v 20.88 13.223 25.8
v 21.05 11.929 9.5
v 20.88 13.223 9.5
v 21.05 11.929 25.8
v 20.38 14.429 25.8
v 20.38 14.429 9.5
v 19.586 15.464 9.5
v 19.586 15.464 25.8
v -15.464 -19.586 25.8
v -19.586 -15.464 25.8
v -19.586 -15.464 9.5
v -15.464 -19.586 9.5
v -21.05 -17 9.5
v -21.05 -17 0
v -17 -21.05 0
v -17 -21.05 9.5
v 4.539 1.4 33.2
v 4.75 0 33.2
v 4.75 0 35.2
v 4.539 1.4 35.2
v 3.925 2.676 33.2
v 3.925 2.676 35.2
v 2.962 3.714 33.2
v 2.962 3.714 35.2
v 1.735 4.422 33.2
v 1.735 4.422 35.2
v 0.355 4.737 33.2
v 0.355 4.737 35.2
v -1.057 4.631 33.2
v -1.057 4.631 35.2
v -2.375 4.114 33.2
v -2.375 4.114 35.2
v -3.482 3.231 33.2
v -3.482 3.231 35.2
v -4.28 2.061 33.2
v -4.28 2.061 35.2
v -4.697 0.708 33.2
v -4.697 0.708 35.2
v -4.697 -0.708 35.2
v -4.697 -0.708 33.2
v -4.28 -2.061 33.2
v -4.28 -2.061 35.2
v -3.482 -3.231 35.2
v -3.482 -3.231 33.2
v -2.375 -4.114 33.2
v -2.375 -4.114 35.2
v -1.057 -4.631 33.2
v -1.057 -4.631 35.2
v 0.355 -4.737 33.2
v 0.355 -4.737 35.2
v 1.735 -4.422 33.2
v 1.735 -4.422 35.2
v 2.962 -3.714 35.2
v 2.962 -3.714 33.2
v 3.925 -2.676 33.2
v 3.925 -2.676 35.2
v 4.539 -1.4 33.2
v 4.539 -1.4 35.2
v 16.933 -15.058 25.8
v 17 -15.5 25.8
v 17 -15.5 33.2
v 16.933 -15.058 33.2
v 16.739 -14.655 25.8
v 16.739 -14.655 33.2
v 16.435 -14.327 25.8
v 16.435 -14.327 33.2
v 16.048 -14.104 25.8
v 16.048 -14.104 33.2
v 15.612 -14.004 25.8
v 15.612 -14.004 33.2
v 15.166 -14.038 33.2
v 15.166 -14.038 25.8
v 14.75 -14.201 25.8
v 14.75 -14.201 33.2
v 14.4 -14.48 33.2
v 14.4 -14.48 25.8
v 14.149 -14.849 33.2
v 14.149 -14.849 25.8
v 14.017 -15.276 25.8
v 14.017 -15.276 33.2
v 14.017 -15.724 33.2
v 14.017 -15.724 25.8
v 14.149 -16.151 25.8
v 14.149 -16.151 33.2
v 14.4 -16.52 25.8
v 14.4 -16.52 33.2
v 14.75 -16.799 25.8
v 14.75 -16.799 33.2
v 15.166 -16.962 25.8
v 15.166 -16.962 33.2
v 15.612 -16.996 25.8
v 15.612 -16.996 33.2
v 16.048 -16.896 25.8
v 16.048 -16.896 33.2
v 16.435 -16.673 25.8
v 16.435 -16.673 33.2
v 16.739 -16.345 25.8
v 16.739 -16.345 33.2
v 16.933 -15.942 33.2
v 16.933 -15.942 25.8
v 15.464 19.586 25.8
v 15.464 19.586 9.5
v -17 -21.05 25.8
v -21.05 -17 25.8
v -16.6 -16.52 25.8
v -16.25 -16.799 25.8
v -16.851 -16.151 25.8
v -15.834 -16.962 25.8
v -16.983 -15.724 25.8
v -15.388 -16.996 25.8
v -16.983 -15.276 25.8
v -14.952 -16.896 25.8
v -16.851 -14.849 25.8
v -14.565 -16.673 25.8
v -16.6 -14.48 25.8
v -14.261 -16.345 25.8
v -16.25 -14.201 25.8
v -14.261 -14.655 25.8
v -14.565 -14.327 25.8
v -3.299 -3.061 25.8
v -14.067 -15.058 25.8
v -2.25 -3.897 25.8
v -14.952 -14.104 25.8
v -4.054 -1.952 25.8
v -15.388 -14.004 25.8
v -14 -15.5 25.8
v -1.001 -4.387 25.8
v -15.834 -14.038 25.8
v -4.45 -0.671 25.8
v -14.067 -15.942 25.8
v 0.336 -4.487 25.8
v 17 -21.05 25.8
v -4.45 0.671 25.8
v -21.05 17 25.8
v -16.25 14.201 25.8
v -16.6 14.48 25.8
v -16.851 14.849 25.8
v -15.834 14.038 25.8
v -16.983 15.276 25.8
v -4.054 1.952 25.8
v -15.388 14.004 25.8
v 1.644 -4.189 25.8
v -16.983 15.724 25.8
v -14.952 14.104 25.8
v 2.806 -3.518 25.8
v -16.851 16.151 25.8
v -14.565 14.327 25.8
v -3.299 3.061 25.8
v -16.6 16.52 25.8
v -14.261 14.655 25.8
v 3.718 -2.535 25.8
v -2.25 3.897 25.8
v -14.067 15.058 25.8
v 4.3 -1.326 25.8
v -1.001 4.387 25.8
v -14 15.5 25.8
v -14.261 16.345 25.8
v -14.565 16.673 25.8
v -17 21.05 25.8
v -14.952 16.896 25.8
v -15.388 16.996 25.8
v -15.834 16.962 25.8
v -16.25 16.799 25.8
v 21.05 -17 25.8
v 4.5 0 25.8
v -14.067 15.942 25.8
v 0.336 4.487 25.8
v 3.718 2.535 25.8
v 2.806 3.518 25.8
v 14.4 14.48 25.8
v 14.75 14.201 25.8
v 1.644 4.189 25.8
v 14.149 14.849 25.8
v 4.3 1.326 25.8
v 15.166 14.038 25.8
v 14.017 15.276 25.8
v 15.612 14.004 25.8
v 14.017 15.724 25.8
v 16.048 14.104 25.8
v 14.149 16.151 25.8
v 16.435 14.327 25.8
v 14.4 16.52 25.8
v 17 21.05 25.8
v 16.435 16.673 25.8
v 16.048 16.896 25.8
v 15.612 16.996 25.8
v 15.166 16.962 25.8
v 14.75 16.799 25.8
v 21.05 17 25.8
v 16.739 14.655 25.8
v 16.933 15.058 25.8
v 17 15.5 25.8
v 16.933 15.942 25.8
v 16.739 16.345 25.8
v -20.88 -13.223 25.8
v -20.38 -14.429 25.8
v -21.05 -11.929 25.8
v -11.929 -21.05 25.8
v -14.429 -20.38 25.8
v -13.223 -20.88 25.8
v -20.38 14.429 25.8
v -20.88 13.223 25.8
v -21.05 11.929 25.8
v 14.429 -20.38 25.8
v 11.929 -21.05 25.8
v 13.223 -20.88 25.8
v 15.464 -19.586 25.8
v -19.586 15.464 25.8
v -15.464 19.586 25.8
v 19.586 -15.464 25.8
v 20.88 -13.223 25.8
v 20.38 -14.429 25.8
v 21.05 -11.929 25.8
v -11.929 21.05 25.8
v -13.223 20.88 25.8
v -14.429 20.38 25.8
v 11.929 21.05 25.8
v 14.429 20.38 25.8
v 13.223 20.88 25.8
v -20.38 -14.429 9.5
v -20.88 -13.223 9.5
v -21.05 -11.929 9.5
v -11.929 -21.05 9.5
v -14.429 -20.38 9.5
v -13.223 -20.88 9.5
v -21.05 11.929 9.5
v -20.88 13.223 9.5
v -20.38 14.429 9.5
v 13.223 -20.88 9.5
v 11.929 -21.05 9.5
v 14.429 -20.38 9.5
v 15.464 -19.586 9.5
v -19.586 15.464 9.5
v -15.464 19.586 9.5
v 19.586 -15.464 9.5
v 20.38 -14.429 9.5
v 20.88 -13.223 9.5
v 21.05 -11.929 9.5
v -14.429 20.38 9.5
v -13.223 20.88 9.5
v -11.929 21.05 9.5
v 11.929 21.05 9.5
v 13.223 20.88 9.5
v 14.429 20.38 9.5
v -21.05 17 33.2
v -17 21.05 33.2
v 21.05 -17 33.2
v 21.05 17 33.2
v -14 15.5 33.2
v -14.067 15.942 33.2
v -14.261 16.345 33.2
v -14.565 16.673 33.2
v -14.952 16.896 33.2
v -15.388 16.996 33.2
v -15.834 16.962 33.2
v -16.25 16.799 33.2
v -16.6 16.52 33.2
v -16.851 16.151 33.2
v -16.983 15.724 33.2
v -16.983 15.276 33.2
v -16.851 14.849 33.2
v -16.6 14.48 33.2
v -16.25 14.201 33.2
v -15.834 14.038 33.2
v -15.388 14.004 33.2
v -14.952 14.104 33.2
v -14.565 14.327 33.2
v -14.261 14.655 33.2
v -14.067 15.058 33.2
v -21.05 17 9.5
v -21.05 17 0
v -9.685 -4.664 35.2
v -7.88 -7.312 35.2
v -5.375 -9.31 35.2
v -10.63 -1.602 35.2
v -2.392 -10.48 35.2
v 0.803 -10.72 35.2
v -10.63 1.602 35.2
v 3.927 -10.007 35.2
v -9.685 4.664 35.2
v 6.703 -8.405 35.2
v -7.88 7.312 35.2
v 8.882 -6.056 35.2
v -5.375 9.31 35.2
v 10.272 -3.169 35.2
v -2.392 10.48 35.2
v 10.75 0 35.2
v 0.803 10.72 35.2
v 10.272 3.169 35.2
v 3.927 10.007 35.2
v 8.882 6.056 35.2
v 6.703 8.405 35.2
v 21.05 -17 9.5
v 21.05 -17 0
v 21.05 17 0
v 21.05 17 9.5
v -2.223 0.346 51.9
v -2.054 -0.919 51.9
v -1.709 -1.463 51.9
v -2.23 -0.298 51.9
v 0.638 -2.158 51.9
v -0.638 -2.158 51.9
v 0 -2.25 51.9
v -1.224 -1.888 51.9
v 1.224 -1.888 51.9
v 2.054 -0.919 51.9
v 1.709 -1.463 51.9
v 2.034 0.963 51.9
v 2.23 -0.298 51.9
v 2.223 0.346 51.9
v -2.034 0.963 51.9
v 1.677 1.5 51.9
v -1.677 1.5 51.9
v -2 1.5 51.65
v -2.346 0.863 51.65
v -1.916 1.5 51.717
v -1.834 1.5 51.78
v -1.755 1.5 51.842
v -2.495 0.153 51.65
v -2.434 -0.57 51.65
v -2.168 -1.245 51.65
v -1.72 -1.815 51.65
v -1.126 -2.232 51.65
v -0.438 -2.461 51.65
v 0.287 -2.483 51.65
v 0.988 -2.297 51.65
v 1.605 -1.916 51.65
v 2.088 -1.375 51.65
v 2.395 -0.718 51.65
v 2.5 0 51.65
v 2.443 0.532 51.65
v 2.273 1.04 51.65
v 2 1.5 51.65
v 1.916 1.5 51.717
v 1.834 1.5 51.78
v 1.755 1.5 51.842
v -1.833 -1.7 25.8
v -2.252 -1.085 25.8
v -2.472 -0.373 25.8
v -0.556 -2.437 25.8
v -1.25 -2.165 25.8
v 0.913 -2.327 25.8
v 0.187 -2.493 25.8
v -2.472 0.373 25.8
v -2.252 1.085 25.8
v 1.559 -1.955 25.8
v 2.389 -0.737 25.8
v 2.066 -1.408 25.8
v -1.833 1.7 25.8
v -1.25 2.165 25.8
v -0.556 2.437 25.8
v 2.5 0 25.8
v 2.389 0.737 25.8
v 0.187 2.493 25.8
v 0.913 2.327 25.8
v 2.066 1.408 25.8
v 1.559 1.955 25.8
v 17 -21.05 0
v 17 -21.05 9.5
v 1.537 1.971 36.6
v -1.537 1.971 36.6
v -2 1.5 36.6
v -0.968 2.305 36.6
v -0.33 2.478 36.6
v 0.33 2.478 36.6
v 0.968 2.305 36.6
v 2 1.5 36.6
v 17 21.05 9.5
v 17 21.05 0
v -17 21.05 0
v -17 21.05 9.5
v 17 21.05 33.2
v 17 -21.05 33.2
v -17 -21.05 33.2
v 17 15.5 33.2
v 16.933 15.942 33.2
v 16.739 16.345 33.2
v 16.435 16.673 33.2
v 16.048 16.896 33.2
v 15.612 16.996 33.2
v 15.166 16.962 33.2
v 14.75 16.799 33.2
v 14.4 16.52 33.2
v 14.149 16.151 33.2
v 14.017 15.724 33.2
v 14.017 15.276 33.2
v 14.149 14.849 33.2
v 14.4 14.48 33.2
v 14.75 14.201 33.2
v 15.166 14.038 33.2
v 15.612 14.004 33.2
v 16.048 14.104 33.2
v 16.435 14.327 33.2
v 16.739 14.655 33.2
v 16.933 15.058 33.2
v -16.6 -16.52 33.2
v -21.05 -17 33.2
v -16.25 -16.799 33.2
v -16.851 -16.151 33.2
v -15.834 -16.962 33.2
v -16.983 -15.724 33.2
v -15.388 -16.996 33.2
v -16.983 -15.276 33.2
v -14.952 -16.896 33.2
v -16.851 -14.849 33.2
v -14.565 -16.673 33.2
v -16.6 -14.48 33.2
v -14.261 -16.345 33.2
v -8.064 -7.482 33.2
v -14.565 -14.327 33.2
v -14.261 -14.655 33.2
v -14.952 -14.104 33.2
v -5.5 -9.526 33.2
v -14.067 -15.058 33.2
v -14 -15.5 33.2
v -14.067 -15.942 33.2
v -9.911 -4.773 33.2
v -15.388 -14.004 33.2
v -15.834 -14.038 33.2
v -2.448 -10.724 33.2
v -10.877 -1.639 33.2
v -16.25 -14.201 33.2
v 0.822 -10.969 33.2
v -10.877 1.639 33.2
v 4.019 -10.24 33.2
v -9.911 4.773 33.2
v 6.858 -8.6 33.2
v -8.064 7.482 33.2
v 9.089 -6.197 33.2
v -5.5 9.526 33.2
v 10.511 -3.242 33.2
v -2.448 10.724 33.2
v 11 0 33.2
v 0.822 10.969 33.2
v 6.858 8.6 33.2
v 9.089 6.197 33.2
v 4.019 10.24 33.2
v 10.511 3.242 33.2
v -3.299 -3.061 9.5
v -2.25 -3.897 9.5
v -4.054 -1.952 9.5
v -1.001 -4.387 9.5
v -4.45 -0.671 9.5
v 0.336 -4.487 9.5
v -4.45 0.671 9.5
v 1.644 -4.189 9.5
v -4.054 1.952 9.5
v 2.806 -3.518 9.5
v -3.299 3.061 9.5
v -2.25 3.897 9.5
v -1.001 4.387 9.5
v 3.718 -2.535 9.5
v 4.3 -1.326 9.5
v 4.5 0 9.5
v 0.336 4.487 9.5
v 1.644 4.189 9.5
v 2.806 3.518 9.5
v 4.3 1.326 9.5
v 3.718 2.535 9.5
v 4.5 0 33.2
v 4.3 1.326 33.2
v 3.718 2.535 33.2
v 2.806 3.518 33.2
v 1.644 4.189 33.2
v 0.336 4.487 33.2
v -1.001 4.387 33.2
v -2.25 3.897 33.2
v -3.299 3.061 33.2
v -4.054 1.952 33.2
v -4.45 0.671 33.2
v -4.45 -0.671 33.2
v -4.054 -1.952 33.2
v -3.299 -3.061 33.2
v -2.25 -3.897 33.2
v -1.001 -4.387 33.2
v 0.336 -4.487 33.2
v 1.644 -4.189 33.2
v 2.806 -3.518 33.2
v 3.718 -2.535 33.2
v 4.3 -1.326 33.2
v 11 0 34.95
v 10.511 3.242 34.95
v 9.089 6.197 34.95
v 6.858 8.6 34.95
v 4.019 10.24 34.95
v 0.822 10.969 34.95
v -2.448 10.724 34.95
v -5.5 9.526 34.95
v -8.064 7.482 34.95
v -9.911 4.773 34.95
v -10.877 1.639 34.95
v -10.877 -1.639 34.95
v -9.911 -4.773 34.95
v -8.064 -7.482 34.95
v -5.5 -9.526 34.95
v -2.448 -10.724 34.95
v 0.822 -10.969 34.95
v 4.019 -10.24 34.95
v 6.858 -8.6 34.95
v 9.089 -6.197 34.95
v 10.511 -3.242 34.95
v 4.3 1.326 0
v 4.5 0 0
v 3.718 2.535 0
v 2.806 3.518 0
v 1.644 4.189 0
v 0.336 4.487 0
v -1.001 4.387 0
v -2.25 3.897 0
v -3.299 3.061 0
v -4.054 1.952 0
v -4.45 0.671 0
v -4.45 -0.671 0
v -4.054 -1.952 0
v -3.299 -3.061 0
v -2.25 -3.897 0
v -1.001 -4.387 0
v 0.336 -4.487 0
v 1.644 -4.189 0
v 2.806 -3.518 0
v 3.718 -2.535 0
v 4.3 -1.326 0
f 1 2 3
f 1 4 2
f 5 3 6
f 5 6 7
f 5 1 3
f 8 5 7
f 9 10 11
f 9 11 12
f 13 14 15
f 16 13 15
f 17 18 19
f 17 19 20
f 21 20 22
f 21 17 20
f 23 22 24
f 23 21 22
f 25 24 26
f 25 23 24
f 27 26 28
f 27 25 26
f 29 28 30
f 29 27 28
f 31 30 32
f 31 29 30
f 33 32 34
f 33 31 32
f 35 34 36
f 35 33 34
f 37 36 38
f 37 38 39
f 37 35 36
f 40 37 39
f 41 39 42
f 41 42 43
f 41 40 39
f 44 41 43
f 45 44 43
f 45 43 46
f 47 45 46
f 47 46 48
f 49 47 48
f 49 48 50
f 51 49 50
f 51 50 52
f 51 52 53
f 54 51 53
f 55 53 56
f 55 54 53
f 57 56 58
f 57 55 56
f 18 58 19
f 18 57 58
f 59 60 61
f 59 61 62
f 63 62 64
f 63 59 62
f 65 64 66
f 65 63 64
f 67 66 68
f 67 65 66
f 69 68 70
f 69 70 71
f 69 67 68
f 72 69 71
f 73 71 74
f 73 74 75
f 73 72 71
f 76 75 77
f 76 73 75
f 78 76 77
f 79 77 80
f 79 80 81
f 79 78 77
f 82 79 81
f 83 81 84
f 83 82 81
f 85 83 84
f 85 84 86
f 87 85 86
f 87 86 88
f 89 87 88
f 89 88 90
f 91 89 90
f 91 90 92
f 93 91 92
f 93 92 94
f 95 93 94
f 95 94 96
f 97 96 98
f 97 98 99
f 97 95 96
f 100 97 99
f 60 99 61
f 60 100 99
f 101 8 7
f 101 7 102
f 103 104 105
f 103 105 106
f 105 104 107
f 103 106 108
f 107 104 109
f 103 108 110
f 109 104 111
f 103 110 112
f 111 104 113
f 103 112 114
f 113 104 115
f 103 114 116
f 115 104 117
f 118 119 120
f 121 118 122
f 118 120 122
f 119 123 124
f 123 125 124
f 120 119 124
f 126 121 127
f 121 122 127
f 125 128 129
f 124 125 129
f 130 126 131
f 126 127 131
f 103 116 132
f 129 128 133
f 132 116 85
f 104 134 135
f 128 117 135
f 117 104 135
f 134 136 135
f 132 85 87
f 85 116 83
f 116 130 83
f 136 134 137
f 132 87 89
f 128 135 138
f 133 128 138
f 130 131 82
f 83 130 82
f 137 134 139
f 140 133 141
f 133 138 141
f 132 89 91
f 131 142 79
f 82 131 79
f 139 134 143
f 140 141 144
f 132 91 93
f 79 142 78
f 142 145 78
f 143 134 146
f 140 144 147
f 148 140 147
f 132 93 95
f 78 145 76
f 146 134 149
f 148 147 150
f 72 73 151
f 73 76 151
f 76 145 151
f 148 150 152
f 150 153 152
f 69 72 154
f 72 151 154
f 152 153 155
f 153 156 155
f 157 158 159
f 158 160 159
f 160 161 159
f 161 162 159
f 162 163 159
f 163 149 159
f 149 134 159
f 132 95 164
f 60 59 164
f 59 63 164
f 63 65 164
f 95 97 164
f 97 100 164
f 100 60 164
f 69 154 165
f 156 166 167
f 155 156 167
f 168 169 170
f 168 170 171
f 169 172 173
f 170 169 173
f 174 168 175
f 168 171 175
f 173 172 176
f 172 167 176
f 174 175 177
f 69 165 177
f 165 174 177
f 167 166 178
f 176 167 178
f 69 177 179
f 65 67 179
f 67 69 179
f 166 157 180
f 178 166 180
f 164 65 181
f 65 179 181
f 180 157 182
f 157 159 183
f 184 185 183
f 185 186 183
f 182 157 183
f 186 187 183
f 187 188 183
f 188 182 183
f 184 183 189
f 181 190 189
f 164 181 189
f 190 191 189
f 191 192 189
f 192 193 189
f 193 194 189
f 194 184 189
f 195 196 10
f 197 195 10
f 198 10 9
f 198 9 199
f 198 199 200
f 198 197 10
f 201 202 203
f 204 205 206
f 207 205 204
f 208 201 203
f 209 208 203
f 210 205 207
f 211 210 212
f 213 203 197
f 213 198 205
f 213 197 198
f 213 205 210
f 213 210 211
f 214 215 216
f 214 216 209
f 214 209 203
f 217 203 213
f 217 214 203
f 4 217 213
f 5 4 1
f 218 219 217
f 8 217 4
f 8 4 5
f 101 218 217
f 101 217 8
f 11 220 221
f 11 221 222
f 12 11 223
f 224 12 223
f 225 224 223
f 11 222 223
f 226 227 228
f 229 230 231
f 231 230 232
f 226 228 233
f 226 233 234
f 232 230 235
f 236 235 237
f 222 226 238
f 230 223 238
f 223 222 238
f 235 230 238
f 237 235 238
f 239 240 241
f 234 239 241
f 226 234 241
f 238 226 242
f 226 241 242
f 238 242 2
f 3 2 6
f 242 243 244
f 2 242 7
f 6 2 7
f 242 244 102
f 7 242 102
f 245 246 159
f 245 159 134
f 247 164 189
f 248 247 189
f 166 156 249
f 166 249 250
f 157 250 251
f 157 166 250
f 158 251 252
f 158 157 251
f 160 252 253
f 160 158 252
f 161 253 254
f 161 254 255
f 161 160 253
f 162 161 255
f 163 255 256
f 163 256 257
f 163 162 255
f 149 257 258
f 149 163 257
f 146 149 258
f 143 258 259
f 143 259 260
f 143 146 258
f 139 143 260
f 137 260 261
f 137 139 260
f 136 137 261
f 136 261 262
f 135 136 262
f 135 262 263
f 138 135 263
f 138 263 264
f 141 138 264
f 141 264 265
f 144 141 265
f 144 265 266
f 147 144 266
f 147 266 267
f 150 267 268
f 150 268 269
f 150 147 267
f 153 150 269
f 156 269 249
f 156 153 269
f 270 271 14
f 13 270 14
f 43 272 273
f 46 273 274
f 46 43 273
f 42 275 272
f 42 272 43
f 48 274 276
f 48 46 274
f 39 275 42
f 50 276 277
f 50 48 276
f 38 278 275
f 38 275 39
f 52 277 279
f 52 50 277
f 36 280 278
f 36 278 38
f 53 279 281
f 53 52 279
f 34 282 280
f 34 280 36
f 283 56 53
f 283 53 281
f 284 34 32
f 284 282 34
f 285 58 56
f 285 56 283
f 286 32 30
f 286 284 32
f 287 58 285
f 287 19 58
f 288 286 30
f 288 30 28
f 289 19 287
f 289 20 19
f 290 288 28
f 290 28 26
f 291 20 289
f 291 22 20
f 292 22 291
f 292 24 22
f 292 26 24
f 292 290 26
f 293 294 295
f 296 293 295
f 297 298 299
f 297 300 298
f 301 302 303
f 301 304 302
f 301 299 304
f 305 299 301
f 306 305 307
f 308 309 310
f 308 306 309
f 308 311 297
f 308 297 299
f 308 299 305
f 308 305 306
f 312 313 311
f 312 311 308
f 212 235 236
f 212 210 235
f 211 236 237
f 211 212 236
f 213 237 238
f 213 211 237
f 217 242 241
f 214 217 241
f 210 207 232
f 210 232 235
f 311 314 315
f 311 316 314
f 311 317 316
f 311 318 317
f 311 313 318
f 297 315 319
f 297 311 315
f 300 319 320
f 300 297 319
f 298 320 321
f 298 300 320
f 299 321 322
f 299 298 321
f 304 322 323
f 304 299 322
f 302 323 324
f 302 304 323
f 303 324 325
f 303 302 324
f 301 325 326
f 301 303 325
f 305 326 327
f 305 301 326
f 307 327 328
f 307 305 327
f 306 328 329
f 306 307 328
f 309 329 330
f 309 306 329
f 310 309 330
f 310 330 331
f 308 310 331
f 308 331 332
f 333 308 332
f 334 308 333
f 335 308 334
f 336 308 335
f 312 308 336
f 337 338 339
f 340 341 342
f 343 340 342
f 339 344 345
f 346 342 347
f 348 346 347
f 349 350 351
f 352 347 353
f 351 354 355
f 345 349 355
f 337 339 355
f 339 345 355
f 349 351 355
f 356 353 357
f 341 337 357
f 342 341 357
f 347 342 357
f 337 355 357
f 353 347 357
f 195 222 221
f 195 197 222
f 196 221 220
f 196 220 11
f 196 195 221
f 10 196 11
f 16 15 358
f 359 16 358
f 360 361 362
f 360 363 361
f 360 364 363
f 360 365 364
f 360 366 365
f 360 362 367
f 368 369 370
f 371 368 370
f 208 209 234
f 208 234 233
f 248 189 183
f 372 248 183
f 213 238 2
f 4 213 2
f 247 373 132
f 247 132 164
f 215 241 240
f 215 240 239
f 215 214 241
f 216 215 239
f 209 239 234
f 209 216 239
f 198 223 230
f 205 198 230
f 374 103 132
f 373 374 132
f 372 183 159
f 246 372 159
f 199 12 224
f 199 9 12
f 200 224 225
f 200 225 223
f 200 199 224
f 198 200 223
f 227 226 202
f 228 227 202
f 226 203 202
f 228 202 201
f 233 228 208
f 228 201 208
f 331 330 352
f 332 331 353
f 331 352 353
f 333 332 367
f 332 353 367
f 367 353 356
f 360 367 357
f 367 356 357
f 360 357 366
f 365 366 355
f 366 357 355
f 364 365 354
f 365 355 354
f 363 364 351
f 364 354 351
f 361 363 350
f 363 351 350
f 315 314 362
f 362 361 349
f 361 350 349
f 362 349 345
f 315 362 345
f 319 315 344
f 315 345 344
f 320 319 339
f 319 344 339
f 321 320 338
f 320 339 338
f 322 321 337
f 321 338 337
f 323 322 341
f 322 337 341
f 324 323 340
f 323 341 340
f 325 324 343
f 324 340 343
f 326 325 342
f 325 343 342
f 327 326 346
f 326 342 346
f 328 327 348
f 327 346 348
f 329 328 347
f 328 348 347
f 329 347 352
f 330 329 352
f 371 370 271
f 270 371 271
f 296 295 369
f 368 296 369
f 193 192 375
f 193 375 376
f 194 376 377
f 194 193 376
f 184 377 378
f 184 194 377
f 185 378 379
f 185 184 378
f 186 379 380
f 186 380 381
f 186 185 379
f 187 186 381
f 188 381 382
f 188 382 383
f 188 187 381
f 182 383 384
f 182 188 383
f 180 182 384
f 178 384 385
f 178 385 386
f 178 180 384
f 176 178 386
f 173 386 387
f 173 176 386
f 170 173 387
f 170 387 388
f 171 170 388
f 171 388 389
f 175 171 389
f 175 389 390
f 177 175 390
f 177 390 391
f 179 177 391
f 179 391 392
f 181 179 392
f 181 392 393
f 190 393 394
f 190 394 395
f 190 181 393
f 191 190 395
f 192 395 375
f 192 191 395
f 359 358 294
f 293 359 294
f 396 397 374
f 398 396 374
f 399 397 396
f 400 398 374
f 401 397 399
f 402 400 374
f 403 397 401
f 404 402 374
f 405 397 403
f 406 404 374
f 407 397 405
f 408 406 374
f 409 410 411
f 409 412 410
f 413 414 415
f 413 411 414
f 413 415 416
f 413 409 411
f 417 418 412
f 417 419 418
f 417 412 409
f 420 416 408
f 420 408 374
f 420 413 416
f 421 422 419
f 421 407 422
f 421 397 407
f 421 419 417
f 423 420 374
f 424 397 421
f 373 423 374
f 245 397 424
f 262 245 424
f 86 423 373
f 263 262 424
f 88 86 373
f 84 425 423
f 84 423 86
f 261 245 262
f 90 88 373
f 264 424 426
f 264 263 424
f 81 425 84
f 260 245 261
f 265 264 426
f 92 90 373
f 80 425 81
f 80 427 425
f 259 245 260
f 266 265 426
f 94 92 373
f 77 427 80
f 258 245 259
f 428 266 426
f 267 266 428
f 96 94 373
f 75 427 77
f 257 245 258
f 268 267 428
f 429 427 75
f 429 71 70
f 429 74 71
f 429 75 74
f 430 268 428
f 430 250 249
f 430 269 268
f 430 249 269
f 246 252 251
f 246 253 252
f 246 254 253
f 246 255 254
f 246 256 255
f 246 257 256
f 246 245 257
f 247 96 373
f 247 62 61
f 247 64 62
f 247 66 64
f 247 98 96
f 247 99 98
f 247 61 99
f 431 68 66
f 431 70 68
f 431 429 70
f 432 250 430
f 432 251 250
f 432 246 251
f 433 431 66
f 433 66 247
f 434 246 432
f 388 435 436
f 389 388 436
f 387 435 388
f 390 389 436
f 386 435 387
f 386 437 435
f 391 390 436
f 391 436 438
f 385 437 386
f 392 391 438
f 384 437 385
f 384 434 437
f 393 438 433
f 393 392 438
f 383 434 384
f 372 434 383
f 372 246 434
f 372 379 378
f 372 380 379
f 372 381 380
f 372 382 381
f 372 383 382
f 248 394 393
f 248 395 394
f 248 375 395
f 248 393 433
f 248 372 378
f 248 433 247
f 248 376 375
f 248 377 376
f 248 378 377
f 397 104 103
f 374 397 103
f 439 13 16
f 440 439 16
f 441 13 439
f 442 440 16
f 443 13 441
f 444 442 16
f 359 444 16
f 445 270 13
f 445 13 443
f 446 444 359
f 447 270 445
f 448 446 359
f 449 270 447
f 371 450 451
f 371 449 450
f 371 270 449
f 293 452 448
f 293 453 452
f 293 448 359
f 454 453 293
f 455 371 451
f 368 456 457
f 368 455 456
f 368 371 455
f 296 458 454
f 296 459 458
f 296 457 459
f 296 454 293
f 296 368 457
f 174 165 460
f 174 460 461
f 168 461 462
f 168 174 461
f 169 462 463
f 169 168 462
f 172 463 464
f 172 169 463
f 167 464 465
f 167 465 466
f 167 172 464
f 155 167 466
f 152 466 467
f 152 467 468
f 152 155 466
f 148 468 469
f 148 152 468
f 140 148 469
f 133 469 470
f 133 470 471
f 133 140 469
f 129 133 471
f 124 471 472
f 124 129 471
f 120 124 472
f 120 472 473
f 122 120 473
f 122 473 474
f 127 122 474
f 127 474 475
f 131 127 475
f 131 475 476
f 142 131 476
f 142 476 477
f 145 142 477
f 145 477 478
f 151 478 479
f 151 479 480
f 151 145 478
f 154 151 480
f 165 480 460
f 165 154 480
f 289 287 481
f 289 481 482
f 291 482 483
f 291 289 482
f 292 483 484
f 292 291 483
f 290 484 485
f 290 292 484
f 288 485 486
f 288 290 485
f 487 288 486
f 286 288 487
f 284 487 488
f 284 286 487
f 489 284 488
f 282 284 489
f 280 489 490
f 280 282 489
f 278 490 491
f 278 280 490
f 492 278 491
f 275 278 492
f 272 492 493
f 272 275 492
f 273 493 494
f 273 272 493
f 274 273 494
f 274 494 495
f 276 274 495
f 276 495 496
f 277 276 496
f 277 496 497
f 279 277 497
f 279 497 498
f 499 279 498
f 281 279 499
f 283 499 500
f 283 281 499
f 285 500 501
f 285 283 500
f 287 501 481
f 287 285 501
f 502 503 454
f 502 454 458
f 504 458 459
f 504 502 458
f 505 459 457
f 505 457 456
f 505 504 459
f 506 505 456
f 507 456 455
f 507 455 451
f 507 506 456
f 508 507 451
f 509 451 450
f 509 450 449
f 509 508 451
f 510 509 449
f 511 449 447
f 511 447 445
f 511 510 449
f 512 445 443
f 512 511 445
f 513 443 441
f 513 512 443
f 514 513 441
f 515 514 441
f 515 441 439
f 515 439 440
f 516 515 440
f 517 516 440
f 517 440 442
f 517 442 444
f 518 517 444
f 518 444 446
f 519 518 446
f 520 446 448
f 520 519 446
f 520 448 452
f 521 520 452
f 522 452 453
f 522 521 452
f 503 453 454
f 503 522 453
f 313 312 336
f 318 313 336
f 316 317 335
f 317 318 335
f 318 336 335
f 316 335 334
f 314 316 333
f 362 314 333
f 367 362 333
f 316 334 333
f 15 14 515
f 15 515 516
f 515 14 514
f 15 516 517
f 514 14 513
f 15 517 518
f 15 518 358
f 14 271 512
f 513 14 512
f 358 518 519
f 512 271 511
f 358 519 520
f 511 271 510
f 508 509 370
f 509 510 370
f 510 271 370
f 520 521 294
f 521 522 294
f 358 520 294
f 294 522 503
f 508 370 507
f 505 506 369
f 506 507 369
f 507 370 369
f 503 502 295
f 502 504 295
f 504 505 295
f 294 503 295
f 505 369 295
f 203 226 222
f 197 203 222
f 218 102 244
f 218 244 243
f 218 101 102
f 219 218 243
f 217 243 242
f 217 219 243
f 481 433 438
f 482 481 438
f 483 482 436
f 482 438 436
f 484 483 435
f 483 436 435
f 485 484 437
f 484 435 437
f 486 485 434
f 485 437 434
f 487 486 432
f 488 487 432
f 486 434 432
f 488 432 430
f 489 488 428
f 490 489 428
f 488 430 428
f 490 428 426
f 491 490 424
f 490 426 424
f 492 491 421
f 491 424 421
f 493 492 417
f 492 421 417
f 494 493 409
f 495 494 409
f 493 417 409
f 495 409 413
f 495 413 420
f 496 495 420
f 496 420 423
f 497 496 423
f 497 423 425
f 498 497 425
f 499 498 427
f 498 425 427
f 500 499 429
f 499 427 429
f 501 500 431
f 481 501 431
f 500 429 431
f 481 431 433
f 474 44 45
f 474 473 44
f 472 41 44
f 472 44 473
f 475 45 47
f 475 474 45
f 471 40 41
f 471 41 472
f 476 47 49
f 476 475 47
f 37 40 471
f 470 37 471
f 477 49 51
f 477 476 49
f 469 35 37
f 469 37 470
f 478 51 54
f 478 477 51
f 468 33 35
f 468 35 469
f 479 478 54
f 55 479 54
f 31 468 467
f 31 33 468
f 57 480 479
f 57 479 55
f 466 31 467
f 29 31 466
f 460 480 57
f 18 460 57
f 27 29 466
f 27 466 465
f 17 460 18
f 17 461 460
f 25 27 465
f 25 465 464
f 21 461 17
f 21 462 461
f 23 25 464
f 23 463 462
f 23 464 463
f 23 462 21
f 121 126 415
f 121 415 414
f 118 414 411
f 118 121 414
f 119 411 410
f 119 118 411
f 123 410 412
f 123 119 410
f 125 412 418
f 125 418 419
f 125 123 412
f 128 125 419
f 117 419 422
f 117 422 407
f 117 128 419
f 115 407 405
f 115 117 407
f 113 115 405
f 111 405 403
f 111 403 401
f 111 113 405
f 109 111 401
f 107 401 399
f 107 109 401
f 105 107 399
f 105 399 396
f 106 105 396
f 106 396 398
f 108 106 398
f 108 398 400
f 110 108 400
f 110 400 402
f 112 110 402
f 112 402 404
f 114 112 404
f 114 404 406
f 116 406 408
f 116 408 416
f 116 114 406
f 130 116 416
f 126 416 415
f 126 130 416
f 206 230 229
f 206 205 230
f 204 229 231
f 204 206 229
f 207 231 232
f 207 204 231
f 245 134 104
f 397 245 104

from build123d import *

# Parameters (mm, degrees)
F0_R      = 4.5
F1_DEPTH  = 9.5
F3_DEPTH  = 16.3
F4_R      = 1.5
F4_R_2    = 4.5
F5_DEPTH  = 7.4
F6_R      = 11
F6_R_2    = 4.75
F7_DEPTH  = 2
F8_SIZE   = 0.25
F9_R      = 2.5
F10_DEPTH = 26.1
F11_SIZE  = 0.25
F12_W     = 6.4639246052
F12_H     = 1.9025028002
F13_DEPTH = 15.3
F14_R     = 5


with BuildPart() as f1:
    # F0 (on Top) → F1 (new body)
    with BuildSketch(Plane.XY):
        Polygon((17, 21.05), (0, 21.05), (-17, 21.05), (-21.05, 17), (-21.05, 0), (-21.05, -17), (-17, -21.05), (0, -21.05), (17, -21.05), (21.05, -17), (21.05, 0), (21.05, 17), align=None)
        Circle(F0_R, mode=Mode.SUBTRACT)
    extrude(amount=F1_DEPTH)


with BuildPart() as f3:
    # F2 (on face) → F3 (new body)
    with BuildSketch(Plane.XY.offset(9.5)):
        Polygon((-21.05, 14), (-21.05, 0), (-21.05, -14), (-14, -21.05), (0, -21.05), (14, -21.05), (21.05, -14), (21.05, 0), (21.05, 14), (14, 21.05), (0, 21.05), (-14, 21.05), align=None)
    extrude(amount=F3_DEPTH)

    # F14
    f14_edges = [f3.edges().sort_by_distance(p)[0] for p in [
        (14, 21.05, 17.65),
        (21.05, 14, 17.65),
        (21.05, -14, 17.65),
        (14, -21.05, 17.65),
        (-14, -21.05, 17.65),
        (-21.05, -14, 17.65),
        (-21.05, 14, 17.65),
        (-14, 21.05, 17.65),
    ]]
    fillet(f14_edges, radius=F14_R)


with BuildPart() as f5:
    # F4 (on face) → F5 (new body)
    with BuildSketch(Plane.XY.offset(25.8)):
        Polygon((16.9999995679, 21.0500004321), (-4.321e-07, 21.0500004321), (-17.0000004321, 21.0500004321), (-21.0500004321, 17.0000004321), (-21.0500004321, 4.321e-07), (-21.0500004321, -16.9999995679), (-17.0000004321, -21.0499995679), (-4.321e-07, -21.0499995679), (16.9999995679, -21.0499995679), (21.0499995679, -16.9999995679), (21.0499995679, 4.321e-07), (21.0499995679, 17.0000004321), align=None)
        with Locations((-15.5, -15.5)):
            Circle(F4_R, mode=Mode.SUBTRACT)
        with Locations((15.5, -15.5)):
            Circle(F4_R, mode=Mode.SUBTRACT)
        with Locations((-4.321e-07, 4.321e-07)):
            Circle(F4_R_2, mode=Mode.SUBTRACT)
        with Locations((-15.5, 15.5)):
            Circle(F4_R, mode=Mode.SUBTRACT)
        with Locations((15.5, 15.5)):
            Circle(F4_R, mode=Mode.SUBTRACT)
    extrude(amount=F5_DEPTH)

    # F6 (on face) → F7 (join)
    with BuildSketch(Plane.XY.offset(33.2)):
        with Locations((-4.321e-07, 4.321e-07)):
            Circle(F6_R)
        with Locations((-4.321e-07, 4.321e-07)):
            Circle(F6_R_2, mode=Mode.SUBTRACT)
    extrude(amount=F7_DEPTH)

    # F8
    f8_edges = [f5.edges().sort_by_distance(p)[0] for p in [
        (-11, 0, 35.2),
    ]]
    chamfer(f8_edges, length=F8_SIZE)


with BuildPart() as f10:
    # F9 (on face) → F10 (new body)
    with BuildSketch(Plane.XY.offset(25.8)):
        Circle(F9_R)
    extrude(amount=F10_DEPTH)

    # F11
    f11_edges = [f10.edges().sort_by_distance(p)[0] for p in [
        (-2.5, 0, 51.9),
    ]]
    chamfer(f11_edges, length=F11_SIZE)

    # F12 (on face) → F13 (cut)
    with BuildSketch(Plane.XY.offset(51.9)):
        with Locations((-0.0116014853, 2.4512514001)):
            Rectangle(F12_W, F12_H)
    extrude(amount=-F13_DEPTH, mode=Mode.SUBTRACT)


solid = Compound([f1.part, f3.part, f5.part, f10.part])
